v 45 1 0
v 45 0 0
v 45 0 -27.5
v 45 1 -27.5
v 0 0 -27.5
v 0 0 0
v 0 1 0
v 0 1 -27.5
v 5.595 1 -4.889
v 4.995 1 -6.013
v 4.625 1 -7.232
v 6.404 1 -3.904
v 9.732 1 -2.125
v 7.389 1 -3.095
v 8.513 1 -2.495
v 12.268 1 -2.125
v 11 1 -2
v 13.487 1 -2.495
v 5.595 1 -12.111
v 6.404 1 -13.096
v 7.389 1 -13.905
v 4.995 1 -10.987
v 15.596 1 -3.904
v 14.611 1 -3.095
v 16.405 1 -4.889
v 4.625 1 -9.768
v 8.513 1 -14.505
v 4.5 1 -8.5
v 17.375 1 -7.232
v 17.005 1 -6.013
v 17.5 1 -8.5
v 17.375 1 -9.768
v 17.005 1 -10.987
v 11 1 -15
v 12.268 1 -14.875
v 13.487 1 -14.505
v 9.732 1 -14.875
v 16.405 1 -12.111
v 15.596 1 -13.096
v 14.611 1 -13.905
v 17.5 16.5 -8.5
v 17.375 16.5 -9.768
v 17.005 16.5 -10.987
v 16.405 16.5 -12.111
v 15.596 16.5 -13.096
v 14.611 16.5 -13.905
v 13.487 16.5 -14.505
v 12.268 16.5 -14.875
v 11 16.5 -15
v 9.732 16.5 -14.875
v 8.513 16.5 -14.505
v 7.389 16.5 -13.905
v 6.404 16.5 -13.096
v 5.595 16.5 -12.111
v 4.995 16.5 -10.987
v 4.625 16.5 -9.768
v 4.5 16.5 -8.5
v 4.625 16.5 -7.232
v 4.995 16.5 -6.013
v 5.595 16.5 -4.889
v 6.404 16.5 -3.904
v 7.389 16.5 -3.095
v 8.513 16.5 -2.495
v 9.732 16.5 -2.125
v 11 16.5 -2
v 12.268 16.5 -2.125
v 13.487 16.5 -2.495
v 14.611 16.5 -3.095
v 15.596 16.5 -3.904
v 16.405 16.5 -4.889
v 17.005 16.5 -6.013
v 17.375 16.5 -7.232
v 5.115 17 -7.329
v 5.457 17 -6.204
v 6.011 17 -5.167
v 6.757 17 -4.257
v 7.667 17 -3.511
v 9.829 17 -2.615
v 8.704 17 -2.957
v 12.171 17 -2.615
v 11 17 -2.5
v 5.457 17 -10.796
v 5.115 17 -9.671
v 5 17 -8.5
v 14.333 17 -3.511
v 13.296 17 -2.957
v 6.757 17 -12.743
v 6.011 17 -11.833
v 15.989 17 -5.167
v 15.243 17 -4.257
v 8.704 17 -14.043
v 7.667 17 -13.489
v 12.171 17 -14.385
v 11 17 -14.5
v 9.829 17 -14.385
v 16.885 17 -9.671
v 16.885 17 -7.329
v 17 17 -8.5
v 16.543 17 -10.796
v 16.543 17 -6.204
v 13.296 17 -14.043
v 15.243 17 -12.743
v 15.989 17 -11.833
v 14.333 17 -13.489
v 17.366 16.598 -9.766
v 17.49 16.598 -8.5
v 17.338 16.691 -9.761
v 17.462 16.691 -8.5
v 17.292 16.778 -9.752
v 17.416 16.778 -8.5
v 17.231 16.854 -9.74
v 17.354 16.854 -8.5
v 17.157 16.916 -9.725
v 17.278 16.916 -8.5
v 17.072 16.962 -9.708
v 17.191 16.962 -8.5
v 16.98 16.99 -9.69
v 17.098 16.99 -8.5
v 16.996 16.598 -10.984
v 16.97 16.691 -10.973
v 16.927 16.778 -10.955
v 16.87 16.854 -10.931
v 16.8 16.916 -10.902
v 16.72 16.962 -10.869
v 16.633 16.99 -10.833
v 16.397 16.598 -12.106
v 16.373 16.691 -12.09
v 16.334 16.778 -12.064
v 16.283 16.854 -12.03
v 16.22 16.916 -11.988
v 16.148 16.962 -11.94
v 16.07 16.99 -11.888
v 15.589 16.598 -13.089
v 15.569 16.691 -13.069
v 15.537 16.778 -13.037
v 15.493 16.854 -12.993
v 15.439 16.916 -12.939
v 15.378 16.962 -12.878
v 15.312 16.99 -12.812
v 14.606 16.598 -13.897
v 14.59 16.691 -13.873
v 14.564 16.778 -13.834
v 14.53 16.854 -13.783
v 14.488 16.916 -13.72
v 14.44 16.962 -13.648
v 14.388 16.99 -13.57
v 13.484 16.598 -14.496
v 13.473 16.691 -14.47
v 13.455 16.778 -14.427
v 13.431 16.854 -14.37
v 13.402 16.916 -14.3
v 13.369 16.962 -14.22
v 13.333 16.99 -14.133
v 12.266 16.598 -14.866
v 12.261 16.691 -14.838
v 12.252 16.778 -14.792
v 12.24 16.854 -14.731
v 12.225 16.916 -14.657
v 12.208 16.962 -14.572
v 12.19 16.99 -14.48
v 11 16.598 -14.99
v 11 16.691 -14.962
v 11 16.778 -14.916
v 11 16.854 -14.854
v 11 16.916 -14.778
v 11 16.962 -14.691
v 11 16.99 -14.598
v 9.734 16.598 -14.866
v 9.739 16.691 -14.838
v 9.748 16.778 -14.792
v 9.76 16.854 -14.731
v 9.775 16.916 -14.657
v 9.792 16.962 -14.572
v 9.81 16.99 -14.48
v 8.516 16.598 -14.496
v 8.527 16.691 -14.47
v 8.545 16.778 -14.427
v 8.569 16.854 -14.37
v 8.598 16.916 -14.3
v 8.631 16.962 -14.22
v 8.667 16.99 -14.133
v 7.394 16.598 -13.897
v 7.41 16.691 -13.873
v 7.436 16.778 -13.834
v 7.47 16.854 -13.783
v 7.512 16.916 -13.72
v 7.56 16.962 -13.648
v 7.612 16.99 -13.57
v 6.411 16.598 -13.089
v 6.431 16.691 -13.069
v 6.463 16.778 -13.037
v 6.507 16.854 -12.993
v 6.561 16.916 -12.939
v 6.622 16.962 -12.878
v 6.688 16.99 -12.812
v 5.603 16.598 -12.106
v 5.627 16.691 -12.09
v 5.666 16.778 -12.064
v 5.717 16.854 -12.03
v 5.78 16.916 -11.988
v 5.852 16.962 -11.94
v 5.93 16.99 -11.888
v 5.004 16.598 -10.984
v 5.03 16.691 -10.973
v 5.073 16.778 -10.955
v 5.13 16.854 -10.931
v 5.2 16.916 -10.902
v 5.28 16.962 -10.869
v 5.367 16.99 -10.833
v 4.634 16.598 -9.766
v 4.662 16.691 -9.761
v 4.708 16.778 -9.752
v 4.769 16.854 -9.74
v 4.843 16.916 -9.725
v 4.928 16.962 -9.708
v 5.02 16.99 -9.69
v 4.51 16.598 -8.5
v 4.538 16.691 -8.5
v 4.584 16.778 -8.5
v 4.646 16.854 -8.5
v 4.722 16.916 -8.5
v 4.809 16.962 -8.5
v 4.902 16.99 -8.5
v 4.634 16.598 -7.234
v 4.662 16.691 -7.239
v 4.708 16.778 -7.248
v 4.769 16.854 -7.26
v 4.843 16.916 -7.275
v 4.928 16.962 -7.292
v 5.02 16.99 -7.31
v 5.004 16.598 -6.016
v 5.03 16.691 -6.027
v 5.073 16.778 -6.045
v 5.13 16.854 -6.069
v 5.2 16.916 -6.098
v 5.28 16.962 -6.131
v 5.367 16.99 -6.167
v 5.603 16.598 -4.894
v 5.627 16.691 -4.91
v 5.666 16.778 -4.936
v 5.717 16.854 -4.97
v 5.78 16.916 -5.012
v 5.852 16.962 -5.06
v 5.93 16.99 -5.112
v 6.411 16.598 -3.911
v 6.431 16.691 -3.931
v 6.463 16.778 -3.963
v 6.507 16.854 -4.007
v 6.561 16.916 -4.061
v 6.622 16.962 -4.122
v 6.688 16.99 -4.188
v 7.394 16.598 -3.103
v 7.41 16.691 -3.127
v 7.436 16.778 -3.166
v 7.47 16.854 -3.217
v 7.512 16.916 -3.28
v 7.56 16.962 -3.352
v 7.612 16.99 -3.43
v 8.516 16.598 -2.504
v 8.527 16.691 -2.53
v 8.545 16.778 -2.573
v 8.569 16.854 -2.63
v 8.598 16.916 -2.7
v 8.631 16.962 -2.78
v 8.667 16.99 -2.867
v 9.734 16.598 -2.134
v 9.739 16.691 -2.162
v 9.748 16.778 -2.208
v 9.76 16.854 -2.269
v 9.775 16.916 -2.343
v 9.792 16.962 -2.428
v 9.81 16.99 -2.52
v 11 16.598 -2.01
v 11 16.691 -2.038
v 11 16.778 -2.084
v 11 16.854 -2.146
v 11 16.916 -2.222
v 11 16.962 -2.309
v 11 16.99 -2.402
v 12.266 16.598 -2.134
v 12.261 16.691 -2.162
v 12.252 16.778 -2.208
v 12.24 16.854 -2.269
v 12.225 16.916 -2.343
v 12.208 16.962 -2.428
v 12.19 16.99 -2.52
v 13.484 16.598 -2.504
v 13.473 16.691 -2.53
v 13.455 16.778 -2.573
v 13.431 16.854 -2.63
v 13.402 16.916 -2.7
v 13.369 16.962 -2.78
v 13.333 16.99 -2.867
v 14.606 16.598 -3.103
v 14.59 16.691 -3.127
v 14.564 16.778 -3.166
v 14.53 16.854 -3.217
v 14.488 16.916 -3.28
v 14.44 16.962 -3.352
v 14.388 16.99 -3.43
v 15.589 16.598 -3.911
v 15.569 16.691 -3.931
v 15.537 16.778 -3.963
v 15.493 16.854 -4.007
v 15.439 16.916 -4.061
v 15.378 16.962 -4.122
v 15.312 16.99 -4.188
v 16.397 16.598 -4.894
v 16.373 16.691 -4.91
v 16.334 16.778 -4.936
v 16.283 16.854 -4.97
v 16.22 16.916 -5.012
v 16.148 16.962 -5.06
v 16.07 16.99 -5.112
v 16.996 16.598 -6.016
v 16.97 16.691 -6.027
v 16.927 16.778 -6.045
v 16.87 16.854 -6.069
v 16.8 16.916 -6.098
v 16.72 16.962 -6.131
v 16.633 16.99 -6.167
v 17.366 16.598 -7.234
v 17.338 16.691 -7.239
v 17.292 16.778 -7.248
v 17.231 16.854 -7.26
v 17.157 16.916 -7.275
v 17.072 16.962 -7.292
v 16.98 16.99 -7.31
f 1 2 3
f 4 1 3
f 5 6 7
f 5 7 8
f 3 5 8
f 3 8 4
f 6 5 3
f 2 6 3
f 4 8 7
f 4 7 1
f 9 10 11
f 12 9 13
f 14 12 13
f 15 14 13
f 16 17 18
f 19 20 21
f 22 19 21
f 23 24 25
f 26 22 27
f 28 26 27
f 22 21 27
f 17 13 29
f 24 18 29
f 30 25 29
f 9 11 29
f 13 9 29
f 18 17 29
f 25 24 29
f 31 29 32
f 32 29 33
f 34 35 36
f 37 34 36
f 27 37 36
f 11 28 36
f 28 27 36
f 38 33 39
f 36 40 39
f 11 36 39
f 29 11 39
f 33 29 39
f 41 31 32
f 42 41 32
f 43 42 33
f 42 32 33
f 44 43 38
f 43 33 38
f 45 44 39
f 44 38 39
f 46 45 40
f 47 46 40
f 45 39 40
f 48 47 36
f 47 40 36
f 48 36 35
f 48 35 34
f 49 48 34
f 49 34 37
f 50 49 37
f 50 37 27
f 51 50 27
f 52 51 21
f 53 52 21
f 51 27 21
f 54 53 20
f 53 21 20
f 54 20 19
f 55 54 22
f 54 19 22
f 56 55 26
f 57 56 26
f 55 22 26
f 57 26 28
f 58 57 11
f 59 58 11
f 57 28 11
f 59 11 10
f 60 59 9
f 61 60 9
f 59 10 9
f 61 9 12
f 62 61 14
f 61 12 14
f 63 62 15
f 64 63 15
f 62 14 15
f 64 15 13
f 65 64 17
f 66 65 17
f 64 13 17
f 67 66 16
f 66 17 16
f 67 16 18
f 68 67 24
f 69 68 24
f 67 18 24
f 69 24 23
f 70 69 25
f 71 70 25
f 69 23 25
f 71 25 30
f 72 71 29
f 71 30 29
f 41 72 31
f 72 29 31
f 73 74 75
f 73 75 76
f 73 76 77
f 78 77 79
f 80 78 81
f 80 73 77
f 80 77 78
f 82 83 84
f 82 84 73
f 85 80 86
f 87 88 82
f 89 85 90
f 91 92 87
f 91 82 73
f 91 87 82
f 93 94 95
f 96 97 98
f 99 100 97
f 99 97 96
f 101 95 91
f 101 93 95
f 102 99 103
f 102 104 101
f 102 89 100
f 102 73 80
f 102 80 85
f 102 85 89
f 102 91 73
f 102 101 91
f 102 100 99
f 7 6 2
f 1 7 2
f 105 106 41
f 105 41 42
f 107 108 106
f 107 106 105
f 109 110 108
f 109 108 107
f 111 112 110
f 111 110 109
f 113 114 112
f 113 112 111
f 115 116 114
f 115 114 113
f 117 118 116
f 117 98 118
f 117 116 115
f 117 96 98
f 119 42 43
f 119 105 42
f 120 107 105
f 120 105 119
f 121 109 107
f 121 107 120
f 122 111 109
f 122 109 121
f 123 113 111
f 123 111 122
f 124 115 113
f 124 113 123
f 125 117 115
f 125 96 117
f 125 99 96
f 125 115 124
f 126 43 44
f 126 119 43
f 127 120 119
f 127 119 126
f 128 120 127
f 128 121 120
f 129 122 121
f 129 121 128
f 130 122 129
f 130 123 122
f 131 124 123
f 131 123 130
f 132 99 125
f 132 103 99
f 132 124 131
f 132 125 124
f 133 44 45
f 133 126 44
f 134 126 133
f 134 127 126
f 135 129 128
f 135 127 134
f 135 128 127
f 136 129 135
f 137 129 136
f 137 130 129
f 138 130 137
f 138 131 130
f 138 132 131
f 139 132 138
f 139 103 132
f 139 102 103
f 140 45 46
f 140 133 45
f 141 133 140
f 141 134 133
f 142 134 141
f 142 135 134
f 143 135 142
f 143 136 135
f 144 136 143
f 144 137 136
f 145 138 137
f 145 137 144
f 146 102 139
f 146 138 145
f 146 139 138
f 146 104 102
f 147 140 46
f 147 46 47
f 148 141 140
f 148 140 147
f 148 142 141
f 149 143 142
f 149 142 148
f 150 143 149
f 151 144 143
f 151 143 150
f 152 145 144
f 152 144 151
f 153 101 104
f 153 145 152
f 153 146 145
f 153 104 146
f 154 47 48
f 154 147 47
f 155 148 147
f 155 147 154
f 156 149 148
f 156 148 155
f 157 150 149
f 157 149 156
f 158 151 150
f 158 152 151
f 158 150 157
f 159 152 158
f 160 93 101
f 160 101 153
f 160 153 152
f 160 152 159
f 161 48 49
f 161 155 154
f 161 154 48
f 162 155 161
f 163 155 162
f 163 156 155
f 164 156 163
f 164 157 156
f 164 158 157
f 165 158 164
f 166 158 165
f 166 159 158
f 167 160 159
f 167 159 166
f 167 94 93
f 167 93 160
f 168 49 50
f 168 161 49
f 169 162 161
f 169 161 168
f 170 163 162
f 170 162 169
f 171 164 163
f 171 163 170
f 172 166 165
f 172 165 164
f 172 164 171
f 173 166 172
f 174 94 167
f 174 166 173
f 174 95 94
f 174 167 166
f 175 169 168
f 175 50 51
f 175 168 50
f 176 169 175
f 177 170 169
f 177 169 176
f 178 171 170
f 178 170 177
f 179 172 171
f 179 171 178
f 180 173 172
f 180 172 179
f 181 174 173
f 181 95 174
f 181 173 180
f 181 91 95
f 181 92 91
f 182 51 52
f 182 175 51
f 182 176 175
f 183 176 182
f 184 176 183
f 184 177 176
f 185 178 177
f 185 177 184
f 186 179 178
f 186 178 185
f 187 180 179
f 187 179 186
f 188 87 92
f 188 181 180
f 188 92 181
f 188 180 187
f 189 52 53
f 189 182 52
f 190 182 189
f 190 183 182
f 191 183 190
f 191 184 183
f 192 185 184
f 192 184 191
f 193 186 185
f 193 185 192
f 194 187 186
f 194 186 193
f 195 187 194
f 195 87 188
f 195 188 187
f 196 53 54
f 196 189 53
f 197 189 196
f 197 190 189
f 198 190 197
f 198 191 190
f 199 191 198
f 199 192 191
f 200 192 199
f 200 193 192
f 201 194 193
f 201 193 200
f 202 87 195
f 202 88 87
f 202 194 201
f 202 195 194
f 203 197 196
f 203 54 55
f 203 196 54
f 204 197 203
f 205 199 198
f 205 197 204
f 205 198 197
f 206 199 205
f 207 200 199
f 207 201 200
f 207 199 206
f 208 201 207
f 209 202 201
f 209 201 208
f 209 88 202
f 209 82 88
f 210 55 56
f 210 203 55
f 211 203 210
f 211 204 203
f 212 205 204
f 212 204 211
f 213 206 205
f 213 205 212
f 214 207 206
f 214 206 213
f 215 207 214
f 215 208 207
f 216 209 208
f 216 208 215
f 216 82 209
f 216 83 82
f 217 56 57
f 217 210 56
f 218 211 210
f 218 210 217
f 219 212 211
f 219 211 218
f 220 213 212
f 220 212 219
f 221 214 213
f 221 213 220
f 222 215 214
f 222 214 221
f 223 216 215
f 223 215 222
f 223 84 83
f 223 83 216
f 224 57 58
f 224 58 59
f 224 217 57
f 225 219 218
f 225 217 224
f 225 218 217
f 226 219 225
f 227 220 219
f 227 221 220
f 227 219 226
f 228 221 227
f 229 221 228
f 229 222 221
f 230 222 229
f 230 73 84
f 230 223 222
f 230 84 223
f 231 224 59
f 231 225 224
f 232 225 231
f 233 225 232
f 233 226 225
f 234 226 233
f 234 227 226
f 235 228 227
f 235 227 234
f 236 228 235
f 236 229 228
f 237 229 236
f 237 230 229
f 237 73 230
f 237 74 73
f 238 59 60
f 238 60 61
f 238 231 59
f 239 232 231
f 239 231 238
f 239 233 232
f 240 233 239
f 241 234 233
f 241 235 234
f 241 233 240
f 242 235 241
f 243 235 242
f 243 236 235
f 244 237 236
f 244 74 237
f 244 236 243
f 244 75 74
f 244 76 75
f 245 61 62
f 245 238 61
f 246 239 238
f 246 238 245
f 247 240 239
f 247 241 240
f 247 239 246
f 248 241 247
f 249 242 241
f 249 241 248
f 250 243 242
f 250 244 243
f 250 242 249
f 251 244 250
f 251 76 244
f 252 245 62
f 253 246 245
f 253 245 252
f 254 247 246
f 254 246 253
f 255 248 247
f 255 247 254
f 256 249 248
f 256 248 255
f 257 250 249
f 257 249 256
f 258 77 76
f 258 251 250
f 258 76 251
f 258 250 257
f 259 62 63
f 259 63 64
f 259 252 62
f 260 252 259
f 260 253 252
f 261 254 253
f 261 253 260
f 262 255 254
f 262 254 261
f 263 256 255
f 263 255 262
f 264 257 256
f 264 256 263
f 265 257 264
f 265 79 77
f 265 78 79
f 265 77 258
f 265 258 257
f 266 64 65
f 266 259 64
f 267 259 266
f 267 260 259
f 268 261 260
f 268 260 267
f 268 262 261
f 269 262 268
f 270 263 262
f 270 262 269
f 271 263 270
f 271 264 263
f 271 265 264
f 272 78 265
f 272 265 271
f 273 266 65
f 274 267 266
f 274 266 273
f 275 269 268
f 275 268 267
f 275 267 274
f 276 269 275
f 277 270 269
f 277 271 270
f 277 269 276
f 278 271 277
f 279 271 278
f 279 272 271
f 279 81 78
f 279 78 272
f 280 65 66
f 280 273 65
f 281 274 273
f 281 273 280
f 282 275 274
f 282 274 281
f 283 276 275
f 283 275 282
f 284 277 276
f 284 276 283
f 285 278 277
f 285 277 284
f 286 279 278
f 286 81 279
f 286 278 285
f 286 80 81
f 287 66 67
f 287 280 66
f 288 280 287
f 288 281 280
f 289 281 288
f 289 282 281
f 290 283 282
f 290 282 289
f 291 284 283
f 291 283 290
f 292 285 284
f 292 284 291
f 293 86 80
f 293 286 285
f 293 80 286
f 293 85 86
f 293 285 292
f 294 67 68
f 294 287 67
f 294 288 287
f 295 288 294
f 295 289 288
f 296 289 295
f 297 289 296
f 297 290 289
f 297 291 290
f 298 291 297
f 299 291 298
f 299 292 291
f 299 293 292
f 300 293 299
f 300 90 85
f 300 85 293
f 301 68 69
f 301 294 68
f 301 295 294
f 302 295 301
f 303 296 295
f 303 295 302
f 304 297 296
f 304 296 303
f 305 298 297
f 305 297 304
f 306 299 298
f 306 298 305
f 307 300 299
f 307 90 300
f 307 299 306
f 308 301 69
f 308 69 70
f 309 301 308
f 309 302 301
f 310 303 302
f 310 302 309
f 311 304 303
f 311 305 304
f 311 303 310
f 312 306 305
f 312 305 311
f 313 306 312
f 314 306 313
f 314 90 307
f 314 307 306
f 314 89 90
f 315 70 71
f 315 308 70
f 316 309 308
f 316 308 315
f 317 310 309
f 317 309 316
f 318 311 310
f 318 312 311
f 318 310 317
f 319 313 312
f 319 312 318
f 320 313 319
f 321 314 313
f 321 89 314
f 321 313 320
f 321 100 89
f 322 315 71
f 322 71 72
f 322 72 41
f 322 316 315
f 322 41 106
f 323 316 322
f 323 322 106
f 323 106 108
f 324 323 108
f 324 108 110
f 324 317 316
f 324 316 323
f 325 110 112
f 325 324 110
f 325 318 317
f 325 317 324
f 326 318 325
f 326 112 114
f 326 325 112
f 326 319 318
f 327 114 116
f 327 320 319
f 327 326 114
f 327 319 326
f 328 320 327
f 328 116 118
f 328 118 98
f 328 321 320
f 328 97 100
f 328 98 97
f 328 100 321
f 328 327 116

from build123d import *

# Parameters (mm, degrees)
SKETCH_1_W      = 45
SKETCH_1_H      = 27.5
EXTRUDE_1_DEPTH = 1
SKETCH_2_R      = 6.5
EXTRUDE_2_DEPTH = 16
FILLET_1_R      = 0.5


with BuildPart() as part:
    # Эскиз1 → Бобышка-Вытянуть1 (new body)
    with BuildSketch(Plane(origin=(0, 0, 0), x_dir=(1, 0, 0), z_dir=(0, 1, 0))):
        with Locations((22.5, 13.75)):
            Rectangle(SKETCH_1_W, SKETCH_1_H)
    extrude(amount=EXTRUDE_1_DEPTH)


with BuildPart() as body_2:
    # Эскиз2 → Бобышка-Вытянуть2 (new body)
    with BuildSketch(Plane(origin=(0, 1, 0), x_dir=(1, 0, 0), z_dir=(0, 1, 0))):
        with Locations((11, 8.5)):
            Circle(SKETCH_2_R)
    extrude(amount=EXTRUDE_2_DEPTH)

    # Скругление1
    fillet_1_edges = [body_2.edges().sort_by_distance(p)[0] for p in [
        (4.5, 17, -8.5),
    ]]
    fillet(fillet_1_edges, radius=FILLET_1_R)


solid = Compound([part.part, body_2.part])
